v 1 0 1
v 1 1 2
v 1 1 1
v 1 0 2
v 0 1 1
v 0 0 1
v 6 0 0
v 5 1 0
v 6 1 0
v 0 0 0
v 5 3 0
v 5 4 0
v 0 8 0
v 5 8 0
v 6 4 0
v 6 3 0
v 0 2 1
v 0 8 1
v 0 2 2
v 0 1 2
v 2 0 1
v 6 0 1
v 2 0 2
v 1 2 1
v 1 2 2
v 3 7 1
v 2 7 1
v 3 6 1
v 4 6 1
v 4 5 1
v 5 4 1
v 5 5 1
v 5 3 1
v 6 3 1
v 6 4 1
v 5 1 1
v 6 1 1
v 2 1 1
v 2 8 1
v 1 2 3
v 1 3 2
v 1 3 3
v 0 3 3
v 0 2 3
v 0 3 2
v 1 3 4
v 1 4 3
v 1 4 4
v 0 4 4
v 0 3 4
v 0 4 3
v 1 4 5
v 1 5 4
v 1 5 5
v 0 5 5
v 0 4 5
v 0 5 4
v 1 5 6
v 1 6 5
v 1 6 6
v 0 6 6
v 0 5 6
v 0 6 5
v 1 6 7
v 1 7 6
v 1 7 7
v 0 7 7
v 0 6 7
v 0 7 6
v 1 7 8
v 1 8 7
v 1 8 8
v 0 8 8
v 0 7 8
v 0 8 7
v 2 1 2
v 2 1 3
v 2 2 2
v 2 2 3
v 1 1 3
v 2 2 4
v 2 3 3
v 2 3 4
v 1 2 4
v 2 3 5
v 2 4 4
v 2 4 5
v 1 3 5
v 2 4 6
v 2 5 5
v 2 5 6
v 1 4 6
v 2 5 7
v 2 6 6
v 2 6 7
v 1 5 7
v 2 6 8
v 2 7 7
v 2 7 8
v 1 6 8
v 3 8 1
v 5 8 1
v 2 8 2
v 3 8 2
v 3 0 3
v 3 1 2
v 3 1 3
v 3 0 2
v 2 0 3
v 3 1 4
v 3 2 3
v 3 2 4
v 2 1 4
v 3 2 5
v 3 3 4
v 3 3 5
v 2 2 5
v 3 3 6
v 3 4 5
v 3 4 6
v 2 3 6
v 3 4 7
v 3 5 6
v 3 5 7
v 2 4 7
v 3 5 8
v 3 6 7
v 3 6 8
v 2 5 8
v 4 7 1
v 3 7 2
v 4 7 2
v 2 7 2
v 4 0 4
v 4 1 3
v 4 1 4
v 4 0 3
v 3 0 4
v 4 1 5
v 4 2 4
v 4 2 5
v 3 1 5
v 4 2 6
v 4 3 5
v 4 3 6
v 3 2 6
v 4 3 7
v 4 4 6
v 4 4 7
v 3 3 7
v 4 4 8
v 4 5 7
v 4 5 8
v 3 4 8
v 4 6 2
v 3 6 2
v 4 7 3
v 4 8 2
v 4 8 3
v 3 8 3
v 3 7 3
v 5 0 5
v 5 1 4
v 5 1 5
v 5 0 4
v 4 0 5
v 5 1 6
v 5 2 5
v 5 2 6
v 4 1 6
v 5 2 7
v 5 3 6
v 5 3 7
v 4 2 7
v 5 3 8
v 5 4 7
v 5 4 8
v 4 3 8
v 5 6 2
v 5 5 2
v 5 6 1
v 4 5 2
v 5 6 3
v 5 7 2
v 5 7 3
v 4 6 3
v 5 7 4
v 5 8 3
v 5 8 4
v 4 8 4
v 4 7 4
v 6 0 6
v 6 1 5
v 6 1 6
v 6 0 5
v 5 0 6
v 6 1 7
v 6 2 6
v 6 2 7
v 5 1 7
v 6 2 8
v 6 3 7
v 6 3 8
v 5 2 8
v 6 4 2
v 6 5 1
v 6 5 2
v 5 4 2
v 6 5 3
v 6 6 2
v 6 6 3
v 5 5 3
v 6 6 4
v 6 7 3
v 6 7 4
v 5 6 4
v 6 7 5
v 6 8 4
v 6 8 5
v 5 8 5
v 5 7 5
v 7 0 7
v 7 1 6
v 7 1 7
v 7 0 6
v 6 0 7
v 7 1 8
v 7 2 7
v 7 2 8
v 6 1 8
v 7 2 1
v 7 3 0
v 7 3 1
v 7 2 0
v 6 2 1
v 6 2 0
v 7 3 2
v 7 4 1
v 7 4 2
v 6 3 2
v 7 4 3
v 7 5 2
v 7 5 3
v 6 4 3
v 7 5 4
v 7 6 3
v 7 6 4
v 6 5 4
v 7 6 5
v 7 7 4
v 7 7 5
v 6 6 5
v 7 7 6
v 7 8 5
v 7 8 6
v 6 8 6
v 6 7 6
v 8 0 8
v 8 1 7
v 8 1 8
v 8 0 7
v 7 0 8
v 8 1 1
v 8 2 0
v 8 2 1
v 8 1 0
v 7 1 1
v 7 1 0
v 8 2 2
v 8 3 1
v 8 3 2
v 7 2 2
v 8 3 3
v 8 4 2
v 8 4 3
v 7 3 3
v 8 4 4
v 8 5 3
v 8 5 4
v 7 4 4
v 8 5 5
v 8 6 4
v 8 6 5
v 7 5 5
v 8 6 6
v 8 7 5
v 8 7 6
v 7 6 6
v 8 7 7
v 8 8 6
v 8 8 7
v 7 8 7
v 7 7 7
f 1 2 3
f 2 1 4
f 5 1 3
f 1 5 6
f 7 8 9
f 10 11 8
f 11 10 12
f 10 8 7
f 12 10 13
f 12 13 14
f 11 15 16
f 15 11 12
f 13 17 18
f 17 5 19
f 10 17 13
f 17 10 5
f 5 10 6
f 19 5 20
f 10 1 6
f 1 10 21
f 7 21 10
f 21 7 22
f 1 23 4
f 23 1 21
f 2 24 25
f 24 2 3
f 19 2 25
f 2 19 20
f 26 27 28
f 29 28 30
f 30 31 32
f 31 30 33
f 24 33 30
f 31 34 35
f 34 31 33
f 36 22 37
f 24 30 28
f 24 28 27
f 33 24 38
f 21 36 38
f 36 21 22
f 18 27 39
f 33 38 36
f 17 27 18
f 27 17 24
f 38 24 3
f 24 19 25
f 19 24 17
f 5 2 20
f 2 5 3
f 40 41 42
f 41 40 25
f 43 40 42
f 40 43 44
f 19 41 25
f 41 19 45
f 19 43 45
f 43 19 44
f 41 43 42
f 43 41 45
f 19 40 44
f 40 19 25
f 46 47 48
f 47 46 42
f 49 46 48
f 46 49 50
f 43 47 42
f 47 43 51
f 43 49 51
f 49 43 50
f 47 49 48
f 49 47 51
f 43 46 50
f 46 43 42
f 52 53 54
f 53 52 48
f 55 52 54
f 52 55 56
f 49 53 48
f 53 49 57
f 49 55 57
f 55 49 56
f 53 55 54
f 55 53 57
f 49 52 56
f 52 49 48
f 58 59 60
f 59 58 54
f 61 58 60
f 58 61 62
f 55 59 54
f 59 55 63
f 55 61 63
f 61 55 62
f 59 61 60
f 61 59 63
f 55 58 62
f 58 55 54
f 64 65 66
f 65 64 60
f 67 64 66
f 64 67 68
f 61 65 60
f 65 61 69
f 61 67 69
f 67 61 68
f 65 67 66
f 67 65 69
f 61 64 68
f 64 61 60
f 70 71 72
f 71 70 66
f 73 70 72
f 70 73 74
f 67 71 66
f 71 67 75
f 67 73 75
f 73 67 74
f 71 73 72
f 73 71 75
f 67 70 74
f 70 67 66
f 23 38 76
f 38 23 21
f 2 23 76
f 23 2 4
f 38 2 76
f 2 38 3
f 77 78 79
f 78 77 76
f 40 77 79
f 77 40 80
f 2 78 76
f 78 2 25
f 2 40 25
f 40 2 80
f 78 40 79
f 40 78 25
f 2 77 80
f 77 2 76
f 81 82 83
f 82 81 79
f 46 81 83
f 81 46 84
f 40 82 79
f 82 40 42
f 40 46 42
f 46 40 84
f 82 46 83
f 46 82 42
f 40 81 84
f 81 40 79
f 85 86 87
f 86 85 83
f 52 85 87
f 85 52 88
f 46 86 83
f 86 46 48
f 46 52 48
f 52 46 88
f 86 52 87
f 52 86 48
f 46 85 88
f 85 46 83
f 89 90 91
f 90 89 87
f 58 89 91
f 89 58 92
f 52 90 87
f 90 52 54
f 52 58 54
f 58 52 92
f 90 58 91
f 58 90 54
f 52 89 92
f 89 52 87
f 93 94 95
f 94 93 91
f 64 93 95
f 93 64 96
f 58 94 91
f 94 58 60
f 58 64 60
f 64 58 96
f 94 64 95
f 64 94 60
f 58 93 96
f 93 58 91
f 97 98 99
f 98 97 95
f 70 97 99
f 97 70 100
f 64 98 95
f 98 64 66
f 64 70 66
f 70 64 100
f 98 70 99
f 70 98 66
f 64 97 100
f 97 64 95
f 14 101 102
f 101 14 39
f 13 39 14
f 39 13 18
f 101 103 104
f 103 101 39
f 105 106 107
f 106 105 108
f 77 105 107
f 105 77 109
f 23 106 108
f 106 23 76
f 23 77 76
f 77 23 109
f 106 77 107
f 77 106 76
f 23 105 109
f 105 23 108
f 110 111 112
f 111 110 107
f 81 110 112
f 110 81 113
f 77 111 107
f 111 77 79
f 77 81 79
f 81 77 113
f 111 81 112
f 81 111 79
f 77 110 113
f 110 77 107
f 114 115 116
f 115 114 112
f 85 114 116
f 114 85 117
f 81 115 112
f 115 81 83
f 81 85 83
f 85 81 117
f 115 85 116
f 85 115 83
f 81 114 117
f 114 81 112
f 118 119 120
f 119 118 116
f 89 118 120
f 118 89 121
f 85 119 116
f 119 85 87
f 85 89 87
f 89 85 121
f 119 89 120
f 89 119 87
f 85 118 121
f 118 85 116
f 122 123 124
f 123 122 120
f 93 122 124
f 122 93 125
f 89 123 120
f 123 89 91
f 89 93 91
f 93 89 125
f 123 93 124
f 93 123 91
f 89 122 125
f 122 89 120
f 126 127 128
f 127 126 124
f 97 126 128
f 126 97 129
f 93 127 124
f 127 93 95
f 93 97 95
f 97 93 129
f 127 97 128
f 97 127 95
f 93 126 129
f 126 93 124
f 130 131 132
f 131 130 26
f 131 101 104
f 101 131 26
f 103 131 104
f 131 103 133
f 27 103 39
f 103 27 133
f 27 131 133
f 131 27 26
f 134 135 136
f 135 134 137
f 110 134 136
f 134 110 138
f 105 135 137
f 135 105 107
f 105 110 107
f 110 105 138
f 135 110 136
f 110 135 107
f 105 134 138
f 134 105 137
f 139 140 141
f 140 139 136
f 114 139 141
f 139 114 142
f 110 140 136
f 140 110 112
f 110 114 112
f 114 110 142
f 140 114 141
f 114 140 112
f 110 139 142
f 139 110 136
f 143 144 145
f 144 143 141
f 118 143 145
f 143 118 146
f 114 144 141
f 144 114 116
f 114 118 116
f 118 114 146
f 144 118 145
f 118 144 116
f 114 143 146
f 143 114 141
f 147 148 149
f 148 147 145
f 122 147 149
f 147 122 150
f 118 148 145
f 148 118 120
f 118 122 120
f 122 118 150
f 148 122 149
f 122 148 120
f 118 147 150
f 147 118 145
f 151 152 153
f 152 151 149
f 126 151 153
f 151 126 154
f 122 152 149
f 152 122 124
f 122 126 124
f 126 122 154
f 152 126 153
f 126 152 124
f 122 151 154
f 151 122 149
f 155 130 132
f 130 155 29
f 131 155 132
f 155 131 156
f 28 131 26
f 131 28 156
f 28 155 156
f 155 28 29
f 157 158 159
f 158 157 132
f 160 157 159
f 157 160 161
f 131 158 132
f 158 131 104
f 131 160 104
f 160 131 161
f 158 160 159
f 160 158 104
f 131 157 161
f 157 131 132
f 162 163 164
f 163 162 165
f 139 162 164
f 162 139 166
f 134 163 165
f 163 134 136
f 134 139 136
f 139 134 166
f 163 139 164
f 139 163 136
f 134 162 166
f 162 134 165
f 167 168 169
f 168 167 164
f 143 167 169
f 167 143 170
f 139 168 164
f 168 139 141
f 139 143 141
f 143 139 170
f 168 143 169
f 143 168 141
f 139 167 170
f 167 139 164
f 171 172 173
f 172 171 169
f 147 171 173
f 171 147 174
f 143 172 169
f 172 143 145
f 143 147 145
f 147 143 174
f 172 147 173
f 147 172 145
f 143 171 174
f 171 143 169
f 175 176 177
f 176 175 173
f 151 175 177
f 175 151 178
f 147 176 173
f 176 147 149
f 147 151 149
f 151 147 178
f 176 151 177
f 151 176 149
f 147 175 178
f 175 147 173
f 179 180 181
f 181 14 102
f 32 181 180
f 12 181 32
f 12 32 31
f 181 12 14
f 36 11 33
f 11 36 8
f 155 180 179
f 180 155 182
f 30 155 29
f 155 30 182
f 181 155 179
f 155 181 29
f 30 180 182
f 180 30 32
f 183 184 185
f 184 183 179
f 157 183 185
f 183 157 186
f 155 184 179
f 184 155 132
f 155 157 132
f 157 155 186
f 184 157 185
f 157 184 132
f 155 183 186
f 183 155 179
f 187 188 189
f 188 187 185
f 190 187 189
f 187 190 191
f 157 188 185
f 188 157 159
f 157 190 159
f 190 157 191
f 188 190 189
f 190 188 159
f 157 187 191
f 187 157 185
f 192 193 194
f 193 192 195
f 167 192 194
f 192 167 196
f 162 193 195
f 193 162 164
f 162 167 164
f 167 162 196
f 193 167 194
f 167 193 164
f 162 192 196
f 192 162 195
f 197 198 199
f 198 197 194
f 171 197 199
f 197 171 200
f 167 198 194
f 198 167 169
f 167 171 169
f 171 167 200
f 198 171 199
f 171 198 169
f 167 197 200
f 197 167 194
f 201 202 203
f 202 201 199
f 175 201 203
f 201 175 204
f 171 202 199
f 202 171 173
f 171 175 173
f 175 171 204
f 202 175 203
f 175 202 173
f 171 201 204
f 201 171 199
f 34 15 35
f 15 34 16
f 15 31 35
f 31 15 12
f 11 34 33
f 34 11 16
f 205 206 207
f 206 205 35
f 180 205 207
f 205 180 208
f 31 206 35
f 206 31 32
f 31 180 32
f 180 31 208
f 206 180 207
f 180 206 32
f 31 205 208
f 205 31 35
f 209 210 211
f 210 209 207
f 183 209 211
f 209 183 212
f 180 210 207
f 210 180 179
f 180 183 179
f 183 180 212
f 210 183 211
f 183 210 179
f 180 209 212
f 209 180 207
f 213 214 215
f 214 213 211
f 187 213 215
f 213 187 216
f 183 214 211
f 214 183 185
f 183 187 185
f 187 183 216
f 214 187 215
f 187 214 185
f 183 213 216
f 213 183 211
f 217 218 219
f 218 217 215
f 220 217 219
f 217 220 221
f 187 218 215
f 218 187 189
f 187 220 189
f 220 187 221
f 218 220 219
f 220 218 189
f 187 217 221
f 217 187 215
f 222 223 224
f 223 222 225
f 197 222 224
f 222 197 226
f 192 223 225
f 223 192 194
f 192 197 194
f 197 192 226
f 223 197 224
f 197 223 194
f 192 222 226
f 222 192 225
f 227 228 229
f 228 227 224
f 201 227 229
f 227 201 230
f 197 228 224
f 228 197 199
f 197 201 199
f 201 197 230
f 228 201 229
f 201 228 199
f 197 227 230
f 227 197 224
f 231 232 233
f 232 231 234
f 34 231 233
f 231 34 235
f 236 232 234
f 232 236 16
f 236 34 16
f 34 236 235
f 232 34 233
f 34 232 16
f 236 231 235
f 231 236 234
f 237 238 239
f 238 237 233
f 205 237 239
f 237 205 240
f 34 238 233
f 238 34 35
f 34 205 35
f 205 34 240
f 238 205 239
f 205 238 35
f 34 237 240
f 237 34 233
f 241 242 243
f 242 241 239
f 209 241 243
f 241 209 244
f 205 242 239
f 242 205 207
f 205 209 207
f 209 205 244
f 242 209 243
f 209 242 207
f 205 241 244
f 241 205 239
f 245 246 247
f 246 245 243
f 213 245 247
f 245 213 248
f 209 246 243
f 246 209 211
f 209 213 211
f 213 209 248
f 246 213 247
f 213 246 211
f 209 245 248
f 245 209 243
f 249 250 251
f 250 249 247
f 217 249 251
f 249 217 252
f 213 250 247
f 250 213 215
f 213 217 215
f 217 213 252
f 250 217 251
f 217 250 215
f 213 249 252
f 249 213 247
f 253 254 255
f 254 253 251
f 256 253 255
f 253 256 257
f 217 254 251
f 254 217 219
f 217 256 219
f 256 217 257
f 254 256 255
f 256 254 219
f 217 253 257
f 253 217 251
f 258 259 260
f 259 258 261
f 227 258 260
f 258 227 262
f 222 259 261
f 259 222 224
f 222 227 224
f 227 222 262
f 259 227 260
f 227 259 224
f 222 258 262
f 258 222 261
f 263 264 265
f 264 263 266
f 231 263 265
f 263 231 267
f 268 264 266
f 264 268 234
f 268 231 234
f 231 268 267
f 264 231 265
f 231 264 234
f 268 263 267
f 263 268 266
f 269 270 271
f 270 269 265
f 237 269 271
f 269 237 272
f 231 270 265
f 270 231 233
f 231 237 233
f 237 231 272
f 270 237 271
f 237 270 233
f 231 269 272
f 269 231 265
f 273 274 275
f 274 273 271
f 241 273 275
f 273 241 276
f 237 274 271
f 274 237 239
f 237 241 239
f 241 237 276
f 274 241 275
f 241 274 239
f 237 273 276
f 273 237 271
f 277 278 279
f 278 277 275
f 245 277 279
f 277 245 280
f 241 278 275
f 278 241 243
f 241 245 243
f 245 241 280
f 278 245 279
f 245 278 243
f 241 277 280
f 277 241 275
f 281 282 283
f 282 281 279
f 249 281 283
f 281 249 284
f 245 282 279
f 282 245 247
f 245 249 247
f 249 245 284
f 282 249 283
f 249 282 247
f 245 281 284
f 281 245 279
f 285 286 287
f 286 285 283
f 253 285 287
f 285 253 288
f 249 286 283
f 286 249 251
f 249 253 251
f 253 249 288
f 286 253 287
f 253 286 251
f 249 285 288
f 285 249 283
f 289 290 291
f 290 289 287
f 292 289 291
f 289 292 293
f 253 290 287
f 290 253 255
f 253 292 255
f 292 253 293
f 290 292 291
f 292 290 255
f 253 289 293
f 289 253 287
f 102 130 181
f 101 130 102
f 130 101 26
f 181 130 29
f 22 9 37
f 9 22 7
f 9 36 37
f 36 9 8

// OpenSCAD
union() {
    translate([0, 0, 0]) cube([1, 1, 1]);
    translate([0, 1, 1]) cube([1, 1, 1]);
    translate([0, 2, 2]) cube([1, 1, 1]);
    translate([0, 3, 3]) cube([1, 1, 1]);
    translate([0, 4, 4]) cube([1, 1, 1]);
    translate([0, 5, 5]) cube([1, 1, 1]);
    translate([0, 6, 6]) cube([1, 1, 1]);
    translate([0, 7, 7]) cube([1, 1, 1]);
    translate([1, 0, 1]) cube([1, 1, 1]);
    translate([1, 1, 2]) cube([1, 1, 1]);
    translate([1, 2, 3]) cube([1, 1, 1]);
    translate([1, 3, 4]) cube([1, 1, 1]);
    translate([1, 4, 5]) cube([1, 1, 1]);
    translate([1, 5, 6]) cube([1, 1, 1]);
    translate([1, 6, 7]) cube([1, 1, 1]);
    translate([1, 7, 0]) cube([1, 1, 1]);
    translate([2, 0, 2]) cube([1, 1, 1]);
    translate([2, 1, 3]) cube([1, 1, 1]);
    translate([2, 2, 4]) cube([1, 1, 1]);
    translate([2, 3, 5]) cube([1, 1, 1]);
    translate([2, 4, 6]) cube([1, 1, 1]);
    translate([2, 5, 7]) cube([1, 1, 1]);
    translate([2, 6, 0]) cube([1, 1, 1]);
    translate([2, 7, 1]) cube([1, 1, 1]);
    translate([3, 0, 3]) cube([1, 1, 1]);
    translate([3, 1, 4]) cube([1, 1, 1]);
    translate([3, 2, 5]) cube([1, 1, 1]);
    translate([3, 3, 6]) cube([1, 1, 1]);
    translate([3, 4, 7]) cube([1, 1, 1]);
    translate([3, 5, 0]) cube([1, 1, 1]);
    translate([3, 6, 1]) cube([1, 1, 1]);
    translate([3, 7, 2]) cube([1, 1, 1]);
    translate([4, 0, 4]) cube([1, 1, 1]);
    translate([4, 1, 5]) cube([1, 1, 1]);
    translate([4, 2, 6]) cube([1, 1, 1]);
    translate([4, 3, 7]) cube([1, 1, 1]);
    translate([4, 4, 0]) cube([1, 1, 1]);
    translate([4, 5, 1]) cube([1, 1, 1]);
    translate([4, 6, 2]) cube([1, 1, 1]);
    translate([4, 7, 3]) cube([1, 1, 1]);
    translate([5, 0, 5]) cube([1, 1, 1]);
    translate([5, 1, 6]) cube([1, 1, 1]);
    translate([5, 2, 7]) cube([1, 1, 1]);
    translate([5, 3, 0]) cube([1, 1, 1]);
    translate([5, 4, 1]) cube([1, 1, 1]);
    translate([5, 5, 2]) cube([1, 1, 1]);
    translate([5, 6, 3]) cube([1, 1, 1]);
    translate([5, 7, 4]) cube([1, 1, 1]);
    translate([6, 0, 6]) cube([1, 1, 1]);
    translate([6, 1, 7]) cube([1, 1, 1]);
    translate([6, 2, 0]) cube([1, 1, 1]);
    translate([6, 3, 1]) cube([1, 1, 1]);
    translate([6, 4, 2]) cube([1, 1, 1]);
    translate([6, 5, 3]) cube([1, 1, 1]);
    translate([6, 6, 4]) cube([1, 1, 1]);
    translate([6, 7, 5]) cube([1, 1, 1]);
    translate([7, 0, 7]) cube([1, 1, 1]);
    translate([7, 1, 0]) cube([1, 1, 1]);
    translate([7, 2, 1]) cube([1, 1, 1]);
    translate([7, 3, 2]) cube([1, 1, 1]);
    translate([7, 4, 3]) cube([1, 1, 1]);
    translate([7, 5, 4]) cube([1, 1, 1]);
    translate([7, 6, 5]) cube([1, 1, 1]);
    translate([7, 7, 6]) cube([1, 1, 1]);
    translate([0, 1, 0]) cube([1, 1, 1]);
    translate([0, 2, 0]) cube([1, 1, 1]);
    translate([0, 3, 0]) cube([1, 1, 1]);
    translate([0, 4, 0]) cube([1, 1, 1]);
    translate([0, 5, 0]) cube([1, 1, 1]);
    translate([0, 6, 0]) cube([1, 1, 1]);
    translate([0, 7, 0]) cube([1, 1, 1]);
    translate([1, 0, 0]) cube([1, 1, 1]);
    translate([1, 1, 0]) cube([1, 1, 1]);
    translate([1, 2, 0]) cube([1, 1, 1]);
    translate([1, 3, 0]) cube([1, 1, 1]);
    translate([1, 4, 0]) cube([1, 1, 1]);
    translate([1, 5, 0]) cube([1, 1, 1]);
    translate([1, 6, 0]) cube([1, 1, 1]);
    translate([2, 0, 0]) cube([1, 1, 1]);
    translate([2, 1, 0]) cube([1, 1, 1]);
    translate([2, 2, 0]) cube([1, 1, 1]);
    translate([2, 3, 0]) cube([1, 1, 1]);
    translate([2, 4, 0]) cube([1, 1, 1]);
    translate([2, 5, 0]) cube([1, 1, 1]);
    translate([2, 7, 0]) cube([1, 1, 1]);
    translate([3, 0, 0]) cube([1, 1, 1]);
    translate([3, 1, 0]) cube([1, 1, 1]);
    translate([3, 2, 0]) cube([1, 1, 1]);
    translate([3, 3, 0]) cube([1, 1, 1]);
    translate([3, 4, 0]) cube([1, 1, 1]);
    translate([3, 6, 0]) cube([1, 1, 1]);
    translate([3, 7, 0]) cube([1, 1, 1]);
    translate([4, 0, 0]) cube([1, 1, 1]);
    translate([4, 1, 0]) cube([1, 1, 1]);
    translate([4, 2, 0]) cube([1, 1, 1]);
    translate([4, 3, 0]) cube([1, 1, 1]);
    translate([4, 5, 0]) cube([1, 1, 1]);
    translate([4, 6, 0]) cube([1, 1, 1]);
    translate([4, 7, 0]) cube([1, 1, 1]);
    translate([5, 0, 0]) cube([1, 1, 1]);
}
